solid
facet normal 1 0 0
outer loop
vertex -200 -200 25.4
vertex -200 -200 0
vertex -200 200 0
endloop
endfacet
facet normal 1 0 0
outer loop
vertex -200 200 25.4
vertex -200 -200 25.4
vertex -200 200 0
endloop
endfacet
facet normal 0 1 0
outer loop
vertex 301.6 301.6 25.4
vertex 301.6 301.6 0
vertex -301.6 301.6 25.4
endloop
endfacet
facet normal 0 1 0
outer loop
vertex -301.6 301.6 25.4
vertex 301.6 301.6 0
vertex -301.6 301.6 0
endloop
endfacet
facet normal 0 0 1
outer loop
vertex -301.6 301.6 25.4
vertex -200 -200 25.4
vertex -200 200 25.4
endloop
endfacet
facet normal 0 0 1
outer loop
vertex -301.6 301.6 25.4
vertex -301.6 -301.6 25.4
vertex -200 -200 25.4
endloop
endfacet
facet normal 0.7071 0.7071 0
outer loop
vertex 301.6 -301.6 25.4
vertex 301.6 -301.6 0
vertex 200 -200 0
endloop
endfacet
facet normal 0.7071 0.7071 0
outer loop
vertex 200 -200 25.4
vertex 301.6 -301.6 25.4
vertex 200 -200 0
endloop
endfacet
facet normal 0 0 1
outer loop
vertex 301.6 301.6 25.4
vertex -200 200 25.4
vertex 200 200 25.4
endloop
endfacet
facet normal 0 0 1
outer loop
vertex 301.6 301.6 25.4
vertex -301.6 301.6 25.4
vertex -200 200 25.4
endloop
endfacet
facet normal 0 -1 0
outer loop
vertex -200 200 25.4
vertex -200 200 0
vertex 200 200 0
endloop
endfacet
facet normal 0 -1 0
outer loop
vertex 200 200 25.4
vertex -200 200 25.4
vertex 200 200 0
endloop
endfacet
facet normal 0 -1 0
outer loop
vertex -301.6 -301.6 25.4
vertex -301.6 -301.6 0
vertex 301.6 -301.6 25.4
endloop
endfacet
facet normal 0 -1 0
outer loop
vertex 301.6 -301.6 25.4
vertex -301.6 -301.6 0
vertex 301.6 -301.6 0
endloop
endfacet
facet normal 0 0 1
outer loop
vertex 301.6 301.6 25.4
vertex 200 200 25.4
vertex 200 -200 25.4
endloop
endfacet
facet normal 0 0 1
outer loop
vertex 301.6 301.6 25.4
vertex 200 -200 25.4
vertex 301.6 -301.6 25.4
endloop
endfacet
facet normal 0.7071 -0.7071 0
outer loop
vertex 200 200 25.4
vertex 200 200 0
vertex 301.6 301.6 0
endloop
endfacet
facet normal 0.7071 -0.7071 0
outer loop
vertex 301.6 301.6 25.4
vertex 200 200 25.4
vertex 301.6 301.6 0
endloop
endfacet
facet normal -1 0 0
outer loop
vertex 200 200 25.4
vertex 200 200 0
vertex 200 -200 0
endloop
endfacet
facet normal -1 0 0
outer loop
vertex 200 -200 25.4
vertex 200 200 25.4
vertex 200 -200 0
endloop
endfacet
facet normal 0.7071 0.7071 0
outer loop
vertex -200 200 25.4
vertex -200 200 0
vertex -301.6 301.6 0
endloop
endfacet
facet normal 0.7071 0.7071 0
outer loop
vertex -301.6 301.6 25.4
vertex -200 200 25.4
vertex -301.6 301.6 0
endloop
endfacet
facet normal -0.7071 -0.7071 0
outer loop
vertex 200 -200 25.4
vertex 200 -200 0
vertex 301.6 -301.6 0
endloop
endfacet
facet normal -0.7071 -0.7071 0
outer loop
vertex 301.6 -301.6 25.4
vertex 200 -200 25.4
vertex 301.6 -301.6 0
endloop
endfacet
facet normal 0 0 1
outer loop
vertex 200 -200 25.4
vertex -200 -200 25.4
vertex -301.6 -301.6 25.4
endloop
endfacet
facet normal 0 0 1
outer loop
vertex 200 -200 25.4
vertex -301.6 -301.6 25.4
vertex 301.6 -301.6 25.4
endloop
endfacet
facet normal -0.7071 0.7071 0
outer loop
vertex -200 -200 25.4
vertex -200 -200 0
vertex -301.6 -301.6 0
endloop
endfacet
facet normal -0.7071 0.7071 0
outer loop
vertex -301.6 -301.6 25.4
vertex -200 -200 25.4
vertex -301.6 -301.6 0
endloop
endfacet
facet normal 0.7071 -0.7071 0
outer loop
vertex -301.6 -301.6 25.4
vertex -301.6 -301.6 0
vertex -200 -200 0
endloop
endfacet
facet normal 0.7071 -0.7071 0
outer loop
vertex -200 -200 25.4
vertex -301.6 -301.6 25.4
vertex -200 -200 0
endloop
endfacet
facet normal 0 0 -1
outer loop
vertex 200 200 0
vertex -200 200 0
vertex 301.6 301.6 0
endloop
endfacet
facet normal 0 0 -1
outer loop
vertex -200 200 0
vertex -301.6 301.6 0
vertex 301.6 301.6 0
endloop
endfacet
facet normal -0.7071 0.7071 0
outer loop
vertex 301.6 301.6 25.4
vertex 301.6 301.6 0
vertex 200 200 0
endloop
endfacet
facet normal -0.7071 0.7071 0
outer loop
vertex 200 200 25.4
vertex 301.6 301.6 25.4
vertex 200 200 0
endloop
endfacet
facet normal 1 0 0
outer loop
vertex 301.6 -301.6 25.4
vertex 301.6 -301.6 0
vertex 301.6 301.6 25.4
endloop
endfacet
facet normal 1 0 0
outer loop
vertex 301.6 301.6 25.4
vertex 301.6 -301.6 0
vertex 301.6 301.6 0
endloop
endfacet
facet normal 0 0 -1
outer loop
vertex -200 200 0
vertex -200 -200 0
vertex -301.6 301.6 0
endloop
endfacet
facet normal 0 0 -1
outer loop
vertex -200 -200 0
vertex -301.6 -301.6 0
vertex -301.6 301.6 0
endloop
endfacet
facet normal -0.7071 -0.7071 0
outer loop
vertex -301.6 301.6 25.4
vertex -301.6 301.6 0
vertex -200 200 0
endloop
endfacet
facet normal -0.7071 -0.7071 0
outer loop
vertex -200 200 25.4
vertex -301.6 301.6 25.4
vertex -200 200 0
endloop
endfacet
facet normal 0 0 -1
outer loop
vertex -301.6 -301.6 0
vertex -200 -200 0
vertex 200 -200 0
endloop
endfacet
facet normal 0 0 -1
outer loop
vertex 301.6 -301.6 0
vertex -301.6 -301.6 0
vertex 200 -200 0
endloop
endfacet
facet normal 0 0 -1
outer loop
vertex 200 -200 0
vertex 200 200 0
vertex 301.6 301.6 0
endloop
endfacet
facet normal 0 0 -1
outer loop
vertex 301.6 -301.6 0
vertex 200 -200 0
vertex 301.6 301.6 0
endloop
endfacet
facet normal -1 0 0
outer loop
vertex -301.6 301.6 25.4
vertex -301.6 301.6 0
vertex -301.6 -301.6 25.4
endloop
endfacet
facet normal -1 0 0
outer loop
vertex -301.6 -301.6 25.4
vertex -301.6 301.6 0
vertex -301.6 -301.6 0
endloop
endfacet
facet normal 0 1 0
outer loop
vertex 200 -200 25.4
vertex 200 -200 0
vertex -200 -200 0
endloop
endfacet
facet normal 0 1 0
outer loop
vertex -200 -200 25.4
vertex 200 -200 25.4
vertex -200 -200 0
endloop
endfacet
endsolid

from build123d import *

# Parameters (mm, degrees)
F1_DEPTH = 25.4
F2_DEPTH = 25.4
F3_DEPTH = 25.4
F4_DEPTH = 25.4


with BuildPart() as f1:
    # F0 (on Top) → F1 (new body)
    with BuildSketch(Plane.XY):
        Polygon((-200, 200), (200, 200), (301.6, 301.6), (-301.6, 301.6), align=None)
    extrude(amount=F1_DEPTH)


with BuildPart() as f2:
    # F0 (on Top) → F2 (new body)
    with BuildSketch(Plane.XY):
        Polygon((-200, -200), (-200, 200), (-301.6, 301.6), (-301.6, -301.6), align=None)
    extrude(amount=F2_DEPTH)


with BuildPart() as f3:
    # F0 (on Top) → F3 (new body)
    with BuildSketch(Plane.XY):
        Polygon((301.6, -301.6), (200, -200), (-200, -200), (-301.6, -301.6), align=None)
    extrude(amount=F3_DEPTH)


with BuildPart() as f4:
    # F0 (on Top) → F4 (new body)
    with BuildSketch(Plane.XY):
        Polygon((301.6, 301.6), (200, 200), (200, -200), (301.6, -301.6), align=None)
    extrude(amount=F4_DEPTH)


solid = Compound([f1.part, f2.part, f3.part, f4.part])
